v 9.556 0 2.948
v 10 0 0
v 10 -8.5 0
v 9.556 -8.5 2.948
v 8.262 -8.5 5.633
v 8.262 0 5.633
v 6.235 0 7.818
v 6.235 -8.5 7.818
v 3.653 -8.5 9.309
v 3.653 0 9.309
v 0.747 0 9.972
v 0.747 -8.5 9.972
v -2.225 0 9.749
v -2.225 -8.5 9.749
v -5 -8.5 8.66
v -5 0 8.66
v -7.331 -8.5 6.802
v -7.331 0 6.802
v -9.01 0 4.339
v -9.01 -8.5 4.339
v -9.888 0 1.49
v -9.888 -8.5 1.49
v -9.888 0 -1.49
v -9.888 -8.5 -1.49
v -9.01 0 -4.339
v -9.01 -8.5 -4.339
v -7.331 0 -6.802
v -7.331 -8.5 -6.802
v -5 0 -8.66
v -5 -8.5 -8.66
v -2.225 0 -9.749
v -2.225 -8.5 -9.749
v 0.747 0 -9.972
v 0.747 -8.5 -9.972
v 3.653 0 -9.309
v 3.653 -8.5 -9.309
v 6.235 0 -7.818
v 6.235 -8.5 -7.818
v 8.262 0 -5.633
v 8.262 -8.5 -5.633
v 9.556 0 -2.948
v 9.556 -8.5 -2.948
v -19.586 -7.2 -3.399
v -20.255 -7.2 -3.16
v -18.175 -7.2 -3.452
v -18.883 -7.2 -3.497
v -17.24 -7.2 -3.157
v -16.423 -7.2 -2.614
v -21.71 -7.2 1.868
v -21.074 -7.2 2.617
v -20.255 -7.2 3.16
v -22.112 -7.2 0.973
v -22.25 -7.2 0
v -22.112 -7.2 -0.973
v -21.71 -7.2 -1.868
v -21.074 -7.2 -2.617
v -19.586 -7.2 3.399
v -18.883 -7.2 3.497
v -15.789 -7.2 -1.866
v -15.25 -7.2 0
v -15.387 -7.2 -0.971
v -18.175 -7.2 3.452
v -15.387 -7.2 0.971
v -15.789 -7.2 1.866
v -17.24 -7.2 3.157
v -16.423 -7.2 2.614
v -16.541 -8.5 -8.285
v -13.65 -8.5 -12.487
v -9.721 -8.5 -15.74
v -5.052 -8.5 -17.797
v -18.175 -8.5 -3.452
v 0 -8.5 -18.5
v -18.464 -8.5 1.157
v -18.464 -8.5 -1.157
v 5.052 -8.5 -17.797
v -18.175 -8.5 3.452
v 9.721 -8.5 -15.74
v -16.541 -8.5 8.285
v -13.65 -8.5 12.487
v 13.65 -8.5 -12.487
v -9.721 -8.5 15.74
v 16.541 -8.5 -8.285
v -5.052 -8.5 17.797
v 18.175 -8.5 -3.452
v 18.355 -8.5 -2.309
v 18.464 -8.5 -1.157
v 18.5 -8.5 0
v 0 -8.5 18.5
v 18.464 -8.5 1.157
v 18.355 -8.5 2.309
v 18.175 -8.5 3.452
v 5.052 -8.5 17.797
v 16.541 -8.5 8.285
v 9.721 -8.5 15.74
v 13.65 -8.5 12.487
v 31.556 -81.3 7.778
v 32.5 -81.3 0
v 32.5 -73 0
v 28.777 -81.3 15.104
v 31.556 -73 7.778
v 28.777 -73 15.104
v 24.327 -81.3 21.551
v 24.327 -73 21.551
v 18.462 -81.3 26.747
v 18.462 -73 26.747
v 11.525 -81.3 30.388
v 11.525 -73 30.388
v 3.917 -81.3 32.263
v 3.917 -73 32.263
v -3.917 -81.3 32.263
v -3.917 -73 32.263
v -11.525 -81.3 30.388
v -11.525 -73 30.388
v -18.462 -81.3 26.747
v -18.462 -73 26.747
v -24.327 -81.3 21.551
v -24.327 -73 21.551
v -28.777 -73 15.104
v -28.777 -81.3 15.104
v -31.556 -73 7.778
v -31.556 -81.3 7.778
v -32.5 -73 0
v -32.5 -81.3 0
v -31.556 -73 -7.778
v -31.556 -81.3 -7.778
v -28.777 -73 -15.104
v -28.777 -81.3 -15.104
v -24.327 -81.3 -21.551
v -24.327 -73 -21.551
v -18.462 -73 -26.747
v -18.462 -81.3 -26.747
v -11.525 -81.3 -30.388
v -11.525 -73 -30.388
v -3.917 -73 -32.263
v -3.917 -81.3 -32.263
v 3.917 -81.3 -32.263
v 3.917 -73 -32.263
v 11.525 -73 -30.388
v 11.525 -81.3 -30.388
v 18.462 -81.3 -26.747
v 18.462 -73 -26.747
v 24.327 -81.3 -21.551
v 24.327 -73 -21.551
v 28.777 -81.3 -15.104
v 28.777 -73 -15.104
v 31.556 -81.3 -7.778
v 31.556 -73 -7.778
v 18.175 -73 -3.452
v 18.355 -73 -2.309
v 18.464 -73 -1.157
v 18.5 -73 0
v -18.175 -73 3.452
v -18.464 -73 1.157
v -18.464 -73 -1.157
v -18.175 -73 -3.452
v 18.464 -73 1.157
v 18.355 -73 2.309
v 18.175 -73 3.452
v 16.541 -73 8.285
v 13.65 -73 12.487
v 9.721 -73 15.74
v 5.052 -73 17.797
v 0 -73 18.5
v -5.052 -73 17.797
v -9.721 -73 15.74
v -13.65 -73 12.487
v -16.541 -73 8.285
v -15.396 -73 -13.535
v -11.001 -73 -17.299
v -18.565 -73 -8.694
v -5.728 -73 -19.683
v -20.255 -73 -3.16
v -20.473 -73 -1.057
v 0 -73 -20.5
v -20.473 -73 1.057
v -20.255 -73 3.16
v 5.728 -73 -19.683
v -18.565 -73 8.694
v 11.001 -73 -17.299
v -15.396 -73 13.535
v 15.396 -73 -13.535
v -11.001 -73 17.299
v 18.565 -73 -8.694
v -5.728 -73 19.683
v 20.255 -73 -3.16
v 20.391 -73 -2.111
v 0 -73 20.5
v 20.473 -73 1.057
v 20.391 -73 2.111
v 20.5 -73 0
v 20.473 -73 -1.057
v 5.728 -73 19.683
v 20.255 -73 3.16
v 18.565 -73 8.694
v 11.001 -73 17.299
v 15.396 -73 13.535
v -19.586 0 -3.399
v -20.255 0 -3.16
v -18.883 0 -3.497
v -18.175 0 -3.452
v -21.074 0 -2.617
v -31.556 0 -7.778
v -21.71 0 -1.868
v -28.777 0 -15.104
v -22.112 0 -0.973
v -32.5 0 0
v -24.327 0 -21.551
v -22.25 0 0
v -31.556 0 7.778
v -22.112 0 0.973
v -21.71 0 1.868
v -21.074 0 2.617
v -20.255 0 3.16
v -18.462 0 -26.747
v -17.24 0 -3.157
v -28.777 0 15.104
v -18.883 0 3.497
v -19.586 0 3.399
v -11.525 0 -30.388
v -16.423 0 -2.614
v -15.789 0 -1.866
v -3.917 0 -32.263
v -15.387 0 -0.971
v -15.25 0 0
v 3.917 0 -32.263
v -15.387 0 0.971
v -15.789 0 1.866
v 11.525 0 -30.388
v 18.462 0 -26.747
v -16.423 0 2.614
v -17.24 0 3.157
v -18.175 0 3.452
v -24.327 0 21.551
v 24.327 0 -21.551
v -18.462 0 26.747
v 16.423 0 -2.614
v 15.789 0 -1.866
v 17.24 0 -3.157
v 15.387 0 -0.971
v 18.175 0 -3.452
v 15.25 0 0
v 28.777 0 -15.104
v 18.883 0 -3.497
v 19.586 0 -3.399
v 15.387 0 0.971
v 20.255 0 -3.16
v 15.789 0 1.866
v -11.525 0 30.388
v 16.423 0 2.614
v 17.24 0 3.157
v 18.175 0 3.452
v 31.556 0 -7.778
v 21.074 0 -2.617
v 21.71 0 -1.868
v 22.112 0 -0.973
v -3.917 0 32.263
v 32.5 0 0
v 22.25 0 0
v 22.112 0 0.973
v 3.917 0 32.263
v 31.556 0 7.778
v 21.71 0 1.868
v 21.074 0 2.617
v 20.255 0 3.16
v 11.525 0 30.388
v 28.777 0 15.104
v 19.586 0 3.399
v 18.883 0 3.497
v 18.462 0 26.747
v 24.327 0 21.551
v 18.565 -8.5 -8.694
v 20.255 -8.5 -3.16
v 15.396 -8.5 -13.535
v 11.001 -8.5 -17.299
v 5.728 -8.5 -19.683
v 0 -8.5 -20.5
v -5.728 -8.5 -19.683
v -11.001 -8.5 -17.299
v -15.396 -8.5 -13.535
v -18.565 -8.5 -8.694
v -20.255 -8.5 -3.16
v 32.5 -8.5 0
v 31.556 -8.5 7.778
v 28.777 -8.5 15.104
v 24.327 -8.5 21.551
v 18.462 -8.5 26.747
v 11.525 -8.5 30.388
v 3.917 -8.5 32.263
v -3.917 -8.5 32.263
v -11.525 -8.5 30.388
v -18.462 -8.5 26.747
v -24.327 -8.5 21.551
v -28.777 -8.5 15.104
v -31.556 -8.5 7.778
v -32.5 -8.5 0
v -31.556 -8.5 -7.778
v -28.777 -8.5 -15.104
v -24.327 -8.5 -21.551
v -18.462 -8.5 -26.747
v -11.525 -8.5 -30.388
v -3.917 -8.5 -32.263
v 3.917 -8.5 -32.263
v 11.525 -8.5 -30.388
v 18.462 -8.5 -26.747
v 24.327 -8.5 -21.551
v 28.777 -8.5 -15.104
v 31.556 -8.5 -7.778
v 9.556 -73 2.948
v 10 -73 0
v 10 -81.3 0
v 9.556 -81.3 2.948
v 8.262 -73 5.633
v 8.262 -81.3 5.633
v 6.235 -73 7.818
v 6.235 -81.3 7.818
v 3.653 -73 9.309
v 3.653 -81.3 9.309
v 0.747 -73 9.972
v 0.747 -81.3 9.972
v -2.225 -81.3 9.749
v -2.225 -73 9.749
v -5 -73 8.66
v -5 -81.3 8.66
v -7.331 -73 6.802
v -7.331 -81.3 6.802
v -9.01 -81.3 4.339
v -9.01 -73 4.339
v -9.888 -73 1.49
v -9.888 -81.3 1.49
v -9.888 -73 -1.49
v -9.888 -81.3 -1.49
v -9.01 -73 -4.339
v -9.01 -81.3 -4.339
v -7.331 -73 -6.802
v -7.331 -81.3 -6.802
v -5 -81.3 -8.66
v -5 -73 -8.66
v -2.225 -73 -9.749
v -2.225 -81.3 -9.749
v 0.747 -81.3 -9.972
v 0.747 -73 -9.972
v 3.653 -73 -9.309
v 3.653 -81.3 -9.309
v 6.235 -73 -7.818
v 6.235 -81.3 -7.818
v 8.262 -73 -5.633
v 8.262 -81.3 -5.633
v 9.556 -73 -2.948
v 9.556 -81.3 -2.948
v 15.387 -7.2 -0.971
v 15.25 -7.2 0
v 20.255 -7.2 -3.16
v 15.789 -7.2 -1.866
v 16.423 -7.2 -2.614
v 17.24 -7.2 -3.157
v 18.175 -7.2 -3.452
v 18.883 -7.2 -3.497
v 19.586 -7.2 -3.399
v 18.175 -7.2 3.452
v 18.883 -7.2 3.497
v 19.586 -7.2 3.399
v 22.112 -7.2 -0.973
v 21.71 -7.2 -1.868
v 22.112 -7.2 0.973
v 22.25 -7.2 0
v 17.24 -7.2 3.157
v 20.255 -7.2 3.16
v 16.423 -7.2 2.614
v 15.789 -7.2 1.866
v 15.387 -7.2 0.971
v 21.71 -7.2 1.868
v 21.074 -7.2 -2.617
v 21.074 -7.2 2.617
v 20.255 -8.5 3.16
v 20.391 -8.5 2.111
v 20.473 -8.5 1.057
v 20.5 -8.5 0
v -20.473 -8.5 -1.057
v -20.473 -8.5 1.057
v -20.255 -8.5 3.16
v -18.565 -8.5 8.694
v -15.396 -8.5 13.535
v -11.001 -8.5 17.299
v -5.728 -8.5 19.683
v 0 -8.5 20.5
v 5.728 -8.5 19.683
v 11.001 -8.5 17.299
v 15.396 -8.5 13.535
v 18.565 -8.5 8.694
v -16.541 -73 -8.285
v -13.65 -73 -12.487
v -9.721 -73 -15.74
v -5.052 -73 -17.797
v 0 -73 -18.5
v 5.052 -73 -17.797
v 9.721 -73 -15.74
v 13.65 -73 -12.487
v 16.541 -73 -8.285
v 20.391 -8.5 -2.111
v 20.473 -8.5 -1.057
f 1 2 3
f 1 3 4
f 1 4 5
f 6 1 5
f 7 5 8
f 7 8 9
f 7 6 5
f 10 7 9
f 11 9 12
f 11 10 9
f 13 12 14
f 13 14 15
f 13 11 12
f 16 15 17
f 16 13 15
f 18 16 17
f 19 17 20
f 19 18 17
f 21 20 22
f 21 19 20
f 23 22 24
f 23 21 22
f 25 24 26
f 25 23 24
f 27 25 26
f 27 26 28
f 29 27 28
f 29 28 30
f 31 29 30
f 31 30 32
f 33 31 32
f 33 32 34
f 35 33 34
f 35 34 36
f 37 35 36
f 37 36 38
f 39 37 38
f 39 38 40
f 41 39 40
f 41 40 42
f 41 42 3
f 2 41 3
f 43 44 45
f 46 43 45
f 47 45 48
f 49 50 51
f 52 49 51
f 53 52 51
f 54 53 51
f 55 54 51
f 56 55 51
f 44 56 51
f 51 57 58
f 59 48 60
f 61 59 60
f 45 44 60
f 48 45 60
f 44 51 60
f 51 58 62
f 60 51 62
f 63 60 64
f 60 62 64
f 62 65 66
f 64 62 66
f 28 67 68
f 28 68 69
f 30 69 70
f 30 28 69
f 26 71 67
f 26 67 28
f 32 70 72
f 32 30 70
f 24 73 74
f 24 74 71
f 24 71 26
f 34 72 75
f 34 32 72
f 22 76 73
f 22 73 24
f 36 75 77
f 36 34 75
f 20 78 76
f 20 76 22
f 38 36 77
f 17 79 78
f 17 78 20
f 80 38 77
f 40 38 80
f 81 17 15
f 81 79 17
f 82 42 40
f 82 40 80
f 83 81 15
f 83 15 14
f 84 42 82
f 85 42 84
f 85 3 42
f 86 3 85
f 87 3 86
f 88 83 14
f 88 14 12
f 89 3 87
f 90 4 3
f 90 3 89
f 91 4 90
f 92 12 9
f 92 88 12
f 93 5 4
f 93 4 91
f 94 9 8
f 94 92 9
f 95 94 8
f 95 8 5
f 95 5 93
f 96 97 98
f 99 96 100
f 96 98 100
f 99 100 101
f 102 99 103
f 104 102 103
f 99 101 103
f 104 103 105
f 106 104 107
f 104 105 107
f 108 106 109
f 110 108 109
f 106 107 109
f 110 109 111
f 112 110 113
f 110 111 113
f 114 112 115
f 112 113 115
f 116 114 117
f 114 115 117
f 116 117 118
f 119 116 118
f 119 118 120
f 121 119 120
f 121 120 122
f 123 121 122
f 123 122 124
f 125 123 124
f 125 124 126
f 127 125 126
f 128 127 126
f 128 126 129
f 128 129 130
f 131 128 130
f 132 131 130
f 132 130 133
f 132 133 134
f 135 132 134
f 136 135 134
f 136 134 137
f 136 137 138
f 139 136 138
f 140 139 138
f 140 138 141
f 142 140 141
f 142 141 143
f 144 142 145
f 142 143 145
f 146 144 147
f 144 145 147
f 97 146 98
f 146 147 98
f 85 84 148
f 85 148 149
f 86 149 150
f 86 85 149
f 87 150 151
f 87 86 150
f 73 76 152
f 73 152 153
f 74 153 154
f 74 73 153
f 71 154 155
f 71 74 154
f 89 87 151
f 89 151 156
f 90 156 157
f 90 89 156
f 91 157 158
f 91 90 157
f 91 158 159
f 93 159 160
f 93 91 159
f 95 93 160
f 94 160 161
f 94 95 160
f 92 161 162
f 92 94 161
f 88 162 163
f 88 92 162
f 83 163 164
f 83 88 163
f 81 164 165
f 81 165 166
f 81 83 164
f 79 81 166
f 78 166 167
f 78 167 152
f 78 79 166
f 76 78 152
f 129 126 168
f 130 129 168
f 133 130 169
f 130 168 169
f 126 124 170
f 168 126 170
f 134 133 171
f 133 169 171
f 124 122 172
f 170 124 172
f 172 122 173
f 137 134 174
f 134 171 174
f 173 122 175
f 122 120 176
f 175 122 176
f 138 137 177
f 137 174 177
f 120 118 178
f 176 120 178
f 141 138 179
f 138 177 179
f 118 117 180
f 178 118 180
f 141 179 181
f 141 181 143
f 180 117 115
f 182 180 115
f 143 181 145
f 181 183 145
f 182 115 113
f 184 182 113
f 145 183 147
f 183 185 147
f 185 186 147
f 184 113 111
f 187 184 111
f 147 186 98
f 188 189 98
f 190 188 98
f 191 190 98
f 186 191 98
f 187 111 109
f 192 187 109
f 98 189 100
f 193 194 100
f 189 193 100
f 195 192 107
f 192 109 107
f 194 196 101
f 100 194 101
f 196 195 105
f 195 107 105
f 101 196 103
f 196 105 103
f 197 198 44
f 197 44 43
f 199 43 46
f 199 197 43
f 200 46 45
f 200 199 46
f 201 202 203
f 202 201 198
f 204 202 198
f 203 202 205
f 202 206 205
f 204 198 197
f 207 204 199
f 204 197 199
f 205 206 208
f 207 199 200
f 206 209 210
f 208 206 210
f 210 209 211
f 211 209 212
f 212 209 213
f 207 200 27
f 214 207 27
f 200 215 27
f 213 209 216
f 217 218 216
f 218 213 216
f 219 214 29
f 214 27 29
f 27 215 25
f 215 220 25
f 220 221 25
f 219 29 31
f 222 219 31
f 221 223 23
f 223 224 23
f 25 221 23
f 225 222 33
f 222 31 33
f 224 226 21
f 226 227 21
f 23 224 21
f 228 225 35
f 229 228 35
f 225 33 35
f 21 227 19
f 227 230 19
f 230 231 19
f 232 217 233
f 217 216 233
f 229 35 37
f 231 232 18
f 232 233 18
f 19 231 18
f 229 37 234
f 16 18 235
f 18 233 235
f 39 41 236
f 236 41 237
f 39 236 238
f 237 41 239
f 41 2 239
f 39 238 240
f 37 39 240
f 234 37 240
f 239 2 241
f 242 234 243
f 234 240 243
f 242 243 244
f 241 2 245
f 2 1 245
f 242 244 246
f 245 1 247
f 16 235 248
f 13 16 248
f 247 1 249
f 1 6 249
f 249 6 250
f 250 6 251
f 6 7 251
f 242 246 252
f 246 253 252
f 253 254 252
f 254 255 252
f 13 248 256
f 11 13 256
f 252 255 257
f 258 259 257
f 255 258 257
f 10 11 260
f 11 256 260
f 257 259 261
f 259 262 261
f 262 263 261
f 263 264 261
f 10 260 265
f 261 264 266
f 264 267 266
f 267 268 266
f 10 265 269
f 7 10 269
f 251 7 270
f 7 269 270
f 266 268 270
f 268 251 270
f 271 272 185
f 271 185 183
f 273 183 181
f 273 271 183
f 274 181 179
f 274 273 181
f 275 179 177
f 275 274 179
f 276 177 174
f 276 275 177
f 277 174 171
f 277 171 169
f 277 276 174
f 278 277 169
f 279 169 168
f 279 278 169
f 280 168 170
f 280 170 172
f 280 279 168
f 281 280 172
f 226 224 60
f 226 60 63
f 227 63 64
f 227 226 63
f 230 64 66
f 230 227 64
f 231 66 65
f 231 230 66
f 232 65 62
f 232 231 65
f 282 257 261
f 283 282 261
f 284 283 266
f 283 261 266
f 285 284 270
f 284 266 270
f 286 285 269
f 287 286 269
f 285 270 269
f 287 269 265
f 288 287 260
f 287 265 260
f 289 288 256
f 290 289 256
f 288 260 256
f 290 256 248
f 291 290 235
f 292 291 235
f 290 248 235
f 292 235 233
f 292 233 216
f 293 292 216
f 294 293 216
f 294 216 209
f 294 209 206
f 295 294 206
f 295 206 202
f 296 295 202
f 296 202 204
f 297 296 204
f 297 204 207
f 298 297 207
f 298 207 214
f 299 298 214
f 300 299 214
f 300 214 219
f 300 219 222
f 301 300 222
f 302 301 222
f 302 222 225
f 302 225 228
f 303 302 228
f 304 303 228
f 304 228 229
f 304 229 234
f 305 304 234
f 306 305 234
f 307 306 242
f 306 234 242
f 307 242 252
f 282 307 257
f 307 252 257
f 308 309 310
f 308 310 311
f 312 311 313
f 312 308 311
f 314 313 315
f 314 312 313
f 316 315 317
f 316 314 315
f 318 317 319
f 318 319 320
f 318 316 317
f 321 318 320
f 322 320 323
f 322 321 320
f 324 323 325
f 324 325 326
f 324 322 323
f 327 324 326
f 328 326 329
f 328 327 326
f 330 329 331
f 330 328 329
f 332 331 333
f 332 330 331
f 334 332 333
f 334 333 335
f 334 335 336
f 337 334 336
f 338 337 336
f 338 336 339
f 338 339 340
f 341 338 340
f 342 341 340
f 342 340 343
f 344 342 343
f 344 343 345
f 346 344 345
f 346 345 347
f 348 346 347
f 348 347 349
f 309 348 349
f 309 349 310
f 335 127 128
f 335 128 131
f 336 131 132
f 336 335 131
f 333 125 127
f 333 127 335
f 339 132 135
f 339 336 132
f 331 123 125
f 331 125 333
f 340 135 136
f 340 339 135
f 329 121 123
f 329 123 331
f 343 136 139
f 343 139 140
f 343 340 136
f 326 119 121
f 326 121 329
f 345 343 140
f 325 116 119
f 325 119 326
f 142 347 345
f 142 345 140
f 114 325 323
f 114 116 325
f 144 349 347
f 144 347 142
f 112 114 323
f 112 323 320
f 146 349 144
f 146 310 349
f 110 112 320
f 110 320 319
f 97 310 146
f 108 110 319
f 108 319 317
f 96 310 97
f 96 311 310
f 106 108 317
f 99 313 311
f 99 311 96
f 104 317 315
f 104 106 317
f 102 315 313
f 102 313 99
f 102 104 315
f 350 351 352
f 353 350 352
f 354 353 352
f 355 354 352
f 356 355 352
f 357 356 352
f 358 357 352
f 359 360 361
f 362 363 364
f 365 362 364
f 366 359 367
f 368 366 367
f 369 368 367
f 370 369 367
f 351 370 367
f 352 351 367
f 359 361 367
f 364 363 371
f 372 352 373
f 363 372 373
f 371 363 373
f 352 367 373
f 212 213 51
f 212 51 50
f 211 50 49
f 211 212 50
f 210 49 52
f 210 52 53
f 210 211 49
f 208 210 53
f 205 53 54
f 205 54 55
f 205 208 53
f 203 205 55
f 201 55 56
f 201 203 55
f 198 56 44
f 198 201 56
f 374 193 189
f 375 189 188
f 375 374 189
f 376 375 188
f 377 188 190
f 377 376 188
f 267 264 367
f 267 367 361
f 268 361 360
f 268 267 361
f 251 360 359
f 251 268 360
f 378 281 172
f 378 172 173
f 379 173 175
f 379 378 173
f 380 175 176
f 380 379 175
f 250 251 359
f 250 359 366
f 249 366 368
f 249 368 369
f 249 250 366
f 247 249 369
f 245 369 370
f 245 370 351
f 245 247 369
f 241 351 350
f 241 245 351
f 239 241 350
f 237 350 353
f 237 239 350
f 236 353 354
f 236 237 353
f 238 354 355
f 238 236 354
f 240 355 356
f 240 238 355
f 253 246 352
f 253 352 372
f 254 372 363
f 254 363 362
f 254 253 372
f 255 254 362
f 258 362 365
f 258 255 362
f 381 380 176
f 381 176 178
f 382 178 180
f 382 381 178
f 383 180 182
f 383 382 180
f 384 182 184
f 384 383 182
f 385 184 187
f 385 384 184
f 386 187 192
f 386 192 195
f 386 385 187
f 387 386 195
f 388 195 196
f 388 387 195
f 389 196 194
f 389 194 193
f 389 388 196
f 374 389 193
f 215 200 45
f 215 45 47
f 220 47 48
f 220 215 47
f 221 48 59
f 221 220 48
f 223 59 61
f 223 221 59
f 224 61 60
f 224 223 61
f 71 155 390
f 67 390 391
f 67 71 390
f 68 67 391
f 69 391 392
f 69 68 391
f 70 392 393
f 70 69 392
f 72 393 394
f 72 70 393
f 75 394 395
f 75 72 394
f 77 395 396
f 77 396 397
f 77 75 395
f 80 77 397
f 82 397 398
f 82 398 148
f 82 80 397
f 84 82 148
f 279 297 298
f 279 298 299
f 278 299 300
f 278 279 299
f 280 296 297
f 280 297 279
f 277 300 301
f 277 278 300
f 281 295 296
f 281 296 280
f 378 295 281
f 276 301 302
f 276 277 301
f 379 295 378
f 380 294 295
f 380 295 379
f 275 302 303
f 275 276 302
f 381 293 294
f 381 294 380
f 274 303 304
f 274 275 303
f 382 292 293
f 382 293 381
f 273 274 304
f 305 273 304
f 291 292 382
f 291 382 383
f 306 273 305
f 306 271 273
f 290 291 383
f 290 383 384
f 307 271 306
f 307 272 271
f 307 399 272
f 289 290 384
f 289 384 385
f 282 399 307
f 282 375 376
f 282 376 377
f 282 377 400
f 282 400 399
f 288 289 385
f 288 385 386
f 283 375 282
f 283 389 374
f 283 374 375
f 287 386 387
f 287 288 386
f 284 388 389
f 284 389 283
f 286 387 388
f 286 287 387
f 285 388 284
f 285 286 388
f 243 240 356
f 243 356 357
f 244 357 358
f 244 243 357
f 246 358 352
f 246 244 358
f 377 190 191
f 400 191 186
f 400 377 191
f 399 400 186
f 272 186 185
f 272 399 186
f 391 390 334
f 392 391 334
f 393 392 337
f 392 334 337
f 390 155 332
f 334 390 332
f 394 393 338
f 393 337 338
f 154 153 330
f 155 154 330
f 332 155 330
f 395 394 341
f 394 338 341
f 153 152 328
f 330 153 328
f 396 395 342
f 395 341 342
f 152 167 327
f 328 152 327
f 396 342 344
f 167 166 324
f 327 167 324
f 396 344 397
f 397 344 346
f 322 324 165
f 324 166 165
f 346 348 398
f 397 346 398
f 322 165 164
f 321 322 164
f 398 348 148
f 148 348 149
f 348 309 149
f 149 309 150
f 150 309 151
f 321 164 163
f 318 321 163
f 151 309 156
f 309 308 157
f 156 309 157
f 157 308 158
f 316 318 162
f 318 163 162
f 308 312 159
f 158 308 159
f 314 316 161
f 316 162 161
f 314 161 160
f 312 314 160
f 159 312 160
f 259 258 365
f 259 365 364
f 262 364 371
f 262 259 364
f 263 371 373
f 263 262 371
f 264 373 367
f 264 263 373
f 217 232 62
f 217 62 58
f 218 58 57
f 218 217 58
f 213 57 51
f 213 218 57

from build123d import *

# Parameters (mm, degrees)
F0_R     = 32.5
F0_R_2   = 10
F1_DEPTH = 81.3
F2_DEPTH = 7.2
F3_START = 8.5
F3_DEPTH = 64.5
F4_START = 8.5
F4_DEPTH = 64.5


with BuildPart() as f1:
    # F0 (on Front) → F1 (new body)
    with BuildSketch(Plane.XZ):
        Circle(F0_R)
        with BuildLine():
            ThreePointArc((-20.255, -3.159901106), (-22.25, 0), (-20.255, 3.159901106))
            ThreePointArc((-20.255, 3.159901106), (0, 20.5), (20.255, 3.159901106))
            ThreePointArc((20.255, 3.159901106), (21.7095185419, 1.8684886941), (22.25, 0))
            ThreePointArc((22.25, 0), (21.7095185419, -1.8684886941), (20.255, -3.159901106))
            ThreePointArc((20.255, -3.159901106), (0, -20.5), (-20.255, -3.159901106))
        make_face(mode=Mode.SUBTRACT)
        with BuildLine():
            ThreePointArc((-18.1750002352, 3.4524448251), (-16.0795600384, 2.2624655603), (-15.25, 0))
            ThreePointArc((-15.25, 0), (-16.0795600384, -2.2624655603), (-18.1750002352, -3.4524448251))
            ThreePointArc((-18.1750002352, -3.4524448251), (0, -18.5000002384), (18.1750002352, -3.4524448251))
            ThreePointArc((18.1750002352, -3.4524448251), (15.25, 0), (18.1750002352, 3.4524448251))
            ThreePointArc((18.1750002352, 3.4524448251), (0, 18.5000002384), (-18.1750002352, 3.4524448251))
        make_face()
        Circle(F0_R_2, mode=Mode.SUBTRACT)
        with BuildLine():
            ThreePointArc((-20.255, 3.159901106), (-19.2374633999, 3.4658879719), (-18.1750002352, 3.4524448251))
            ThreePointArc((-18.1750002352, 3.4524448251), (0, 18.5000002384), (18.1750002352, 3.4524448251))
            ThreePointArc((18.1750002352, 3.4524448251), (19.2374633999, 3.4658879719), (20.255, 3.159901106))
            ThreePointArc((20.255, 3.159901106), (0, 20.5), (-20.255, 3.159901106))
        make_face()
        with BuildLine():
            ThreePointArc((18.1750002352, -3.4524448251), (0, -18.5000002384), (-18.1750002352, -3.4524448251))
            ThreePointArc((-18.1750002352, -3.4524448251), (-19.2374633999, -3.4658879719), (-20.255, -3.159901106))
            ThreePointArc((-20.255, -3.159901106), (0, -20.5), (20.255, -3.159901106))
            ThreePointArc((20.255, -3.159901106), (19.2374633999, -3.4658879719), (18.1750002352, -3.4524448251))
        make_face()
        with BuildLine():
            ThreePointArc((-18.1750002352, -3.4524448251), (-16.0795600384, -2.2624655603), (-15.25, 0))
            ThreePointArc((-15.25, 0), (-16.0795600384, 2.2624655603), (-18.1750002352, 3.4524448251))
            ThreePointArc((-18.1750002352, 3.4524448251), (-18.5000002384, 0), (-18.1750002352, -3.4524448251))
        make_face()
        with BuildLine():
            ThreePointArc((18.5000002384, 0), (18.4185710291, 1.7338541081), (18.1750002352, 3.4524448251))
            ThreePointArc((18.1750002352, 3.4524448251), (15.25, 0), (18.1750002352, -3.4524448251))
            ThreePointArc((18.1750002352, -3.4524448251), (18.4185710291, -1.7338541081), (18.5000002384, 0))
        make_face()
        with BuildLine():
            ThreePointArc((20.255, 3.159901106), (19.2374633999, 3.4658879719), (18.1750002352, 3.4524448251))
            ThreePointArc((18.1750002352, 3.4524448251), (18.4185710291, 1.7338541081), (18.5000002384, 0))
            ThreePointArc((18.5000002384, 0), (18.4185710291, -1.7338541081), (18.1750002352, -3.4524448251))
            ThreePointArc((18.1750002352, -3.4524448251), (19.2374633999, -3.4658879719), (20.255, -3.159901106))
            ThreePointArc((20.255, -3.159901106), (20.4386582241, -1.5846923992), (20.5, 0))
            ThreePointArc((20.5, 0), (20.4386582241, 1.5846923992), (20.255, 3.159901106))
        make_face()
        with BuildLine():
            ThreePointArc((-18.1750002352, -3.4524448251), (-18.5000002384, 0), (-18.1750002352, 3.4524448251))
            ThreePointArc((-18.1750002352, 3.4524448251), (-19.2374633999, 3.4658879719), (-20.255, 3.159901106))
            ThreePointArc((-20.255, 3.159901106), (-20.5, 0), (-20.255, -3.159901106))
            ThreePointArc((-20.255, -3.159901106), (-19.2374633999, -3.4658879719), (-18.1750002352, -3.4524448251))
        make_face()
        with BuildLine():
            ThreePointArc((22.25, 0), (21.7095185419, 1.8684886941), (20.255, 3.159901106))
            ThreePointArc((20.255, 3.159901106), (20.4386582241, 1.5846923992), (20.5, 0))
            ThreePointArc((20.5, 0), (20.4386582241, -1.5846923992), (20.255, -3.159901106))
            ThreePointArc((20.255, -3.159901106), (21.7095185419, -1.8684886941), (22.25, 0))
        make_face()
        with BuildLine():
            ThreePointArc((-20.255, -3.159901106), (-20.5, 0), (-20.255, 3.159901106))
            ThreePointArc((-20.255, 3.159901106), (-22.25, 0), (-20.255, -3.159901106))
        make_face()
    extrude(amount=F1_DEPTH)

    # F0 (on Front) → F2 (cut)
    with BuildSketch(Plane.XZ):
        with BuildLine():
            ThreePointArc((22.25, 0), (21.7095185419, 1.8684886941), (20.255, 3.159901106))
            ThreePointArc((20.255, 3.159901106), (20.4386582241, 1.5846923992), (20.5, 0))
            ThreePointArc((20.5, 0), (20.4386582241, -1.5846923992), (20.255, -3.159901106))
            ThreePointArc((20.255, -3.159901106), (21.7095185419, -1.8684886941), (22.25, 0))
        make_face()
        with BuildLine():
            ThreePointArc((20.255, 3.159901106), (19.2374633999, 3.4658879719), (18.1750002352, 3.4524448251))
            ThreePointArc((18.1750002352, 3.4524448251), (18.4185710291, 1.7338541081), (18.5000002384, 0))
            ThreePointArc((18.5000002384, 0), (18.4185710291, -1.7338541081), (18.1750002352, -3.4524448251))
            ThreePointArc((18.1750002352, -3.4524448251), (19.2374633999, -3.4658879719), (20.255, -3.159901106))
            ThreePointArc((20.255, -3.159901106), (20.4386582241, -1.5846923992), (20.5, 0))
            ThreePointArc((20.5, 0), (20.4386582241, 1.5846923992), (20.255, 3.159901106))
        make_face()
        with BuildLine():
            ThreePointArc((-20.255, -3.159901106), (-20.5, 0), (-20.255, 3.159901106))
            ThreePointArc((-20.255, 3.159901106), (-22.25, 0), (-20.255, -3.159901106))
        make_face()
        with BuildLine():
            ThreePointArc((-18.1750002352, -3.4524448251), (-18.5000002384, 0), (-18.1750002352, 3.4524448251))
            ThreePointArc((-18.1750002352, 3.4524448251), (-19.2374633999, 3.4658879719), (-20.255, 3.159901106))
            ThreePointArc((-20.255, 3.159901106), (-20.5, 0), (-20.255, -3.159901106))
            ThreePointArc((-20.255, -3.159901106), (-19.2374633999, -3.4658879719), (-18.1750002352, -3.4524448251))
        make_face()
        with BuildLine():
            ThreePointArc((-18.1750002352, -3.4524448251), (-16.0795600384, -2.2624655603), (-15.25, 0))
            ThreePointArc((-15.25, 0), (-16.0795600384, 2.2624655603), (-18.1750002352, 3.4524448251))
            ThreePointArc((-18.1750002352, 3.4524448251), (-18.5000002384, 0), (-18.1750002352, -3.4524448251))
        make_face()
        with BuildLine():
            ThreePointArc((18.5000002384, 0), (18.4185710291, 1.7338541081), (18.1750002352, 3.4524448251))
            ThreePointArc((18.1750002352, 3.4524448251), (15.25, 0), (18.1750002352, -3.4524448251))
            ThreePointArc((18.1750002352, -3.4524448251), (18.4185710291, -1.7338541081), (18.5000002384, 0))
        make_face()
    extrude(amount=F2_DEPTH, mode=Mode.SUBTRACT)

    # F0 (on Front) → F3 (cut)
    with BuildSketch(Plane.XZ.offset(F3_START)):
        Circle(F0_R)
        with BuildLine():
            ThreePointArc((-20.255, -3.159901106), (-22.25, 0), (-20.255, 3.159901106))
            ThreePointArc((-20.255, 3.159901106), (0, 20.5), (20.255, 3.159901106))
            ThreePointArc((20.255, 3.159901106), (21.7095185419, 1.8684886941), (22.25, 0))
            ThreePointArc((22.25, 0), (21.7095185419, -1.8684886941), (20.255, -3.159901106))
            ThreePointArc((20.255, -3.159901106), (0, -20.5), (-20.255, -3.159901106))
        make_face(mode=Mode.SUBTRACT)
        with BuildLine():
            ThreePointArc((-20.255, -3.159901106), (-20.5, 0), (-20.255, 3.159901106))
            ThreePointArc((-20.255, 3.159901106), (-22.25, 0), (-20.255, -3.159901106))
        make_face()
        with BuildLine():
            ThreePointArc((22.25, 0), (21.7095185419, 1.8684886941), (20.255, 3.159901106))
            ThreePointArc((20.255, 3.159901106), (20.4386582241, 1.5846923992), (20.5, 0))
            ThreePointArc((20.5, 0), (20.4386582241, -1.5846923992), (20.255, -3.159901106))
            ThreePointArc((20.255, -3.159901106), (21.7095185419, -1.8684886941), (22.25, 0))
        make_face()
    extrude(amount=F3_DEPTH, mode=Mode.SUBTRACT)

    # F0 (on Front) → F4 (cut)
    with BuildSketch(Plane.XZ.offset(F4_START)):
        with BuildLine():
            ThreePointArc((-18.1750002352, 3.4524448251), (-16.0795600384, 2.2624655603), (-15.25, 0))
            ThreePointArc((-15.25, 0), (-16.0795600384, -2.2624655603), (-18.1750002352, -3.4524448251))
            ThreePointArc((-18.1750002352, -3.4524448251), (0, -18.5000002384), (18.1750002352, -3.4524448251))
            ThreePointArc((18.1750002352, -3.4524448251), (15.25, 0), (18.1750002352, 3.4524448251))
            ThreePointArc((18.1750002352, 3.4524448251), (0, 18.5000002384), (-18.1750002352, 3.4524448251))
        make_face()
        Circle(F0_R_2, mode=Mode.SUBTRACT)
        with BuildLine():
            ThreePointArc((-18.1750002352, -3.4524448251), (-16.0795600384, -2.2624655603), (-15.25, 0))
            ThreePointArc((-15.25, 0), (-16.0795600384, 2.2624655603), (-18.1750002352, 3.4524448251))
            ThreePointArc((-18.1750002352, 3.4524448251), (-18.5000002384, 0), (-18.1750002352, -3.4524448251))
        make_face()
        with BuildLine():
            ThreePointArc((18.5000002384, 0), (18.4185710291, 1.7338541081), (18.1750002352, 3.4524448251))
            ThreePointArc((18.1750002352, 3.4524448251), (15.25, 0), (18.1750002352, -3.4524448251))
            ThreePointArc((18.1750002352, -3.4524448251), (18.4185710291, -1.7338541081), (18.5000002384, 0))
        make_face()
    extrude(amount=F4_DEPTH, mode=Mode.SUBTRACT)


solid = f1.part
